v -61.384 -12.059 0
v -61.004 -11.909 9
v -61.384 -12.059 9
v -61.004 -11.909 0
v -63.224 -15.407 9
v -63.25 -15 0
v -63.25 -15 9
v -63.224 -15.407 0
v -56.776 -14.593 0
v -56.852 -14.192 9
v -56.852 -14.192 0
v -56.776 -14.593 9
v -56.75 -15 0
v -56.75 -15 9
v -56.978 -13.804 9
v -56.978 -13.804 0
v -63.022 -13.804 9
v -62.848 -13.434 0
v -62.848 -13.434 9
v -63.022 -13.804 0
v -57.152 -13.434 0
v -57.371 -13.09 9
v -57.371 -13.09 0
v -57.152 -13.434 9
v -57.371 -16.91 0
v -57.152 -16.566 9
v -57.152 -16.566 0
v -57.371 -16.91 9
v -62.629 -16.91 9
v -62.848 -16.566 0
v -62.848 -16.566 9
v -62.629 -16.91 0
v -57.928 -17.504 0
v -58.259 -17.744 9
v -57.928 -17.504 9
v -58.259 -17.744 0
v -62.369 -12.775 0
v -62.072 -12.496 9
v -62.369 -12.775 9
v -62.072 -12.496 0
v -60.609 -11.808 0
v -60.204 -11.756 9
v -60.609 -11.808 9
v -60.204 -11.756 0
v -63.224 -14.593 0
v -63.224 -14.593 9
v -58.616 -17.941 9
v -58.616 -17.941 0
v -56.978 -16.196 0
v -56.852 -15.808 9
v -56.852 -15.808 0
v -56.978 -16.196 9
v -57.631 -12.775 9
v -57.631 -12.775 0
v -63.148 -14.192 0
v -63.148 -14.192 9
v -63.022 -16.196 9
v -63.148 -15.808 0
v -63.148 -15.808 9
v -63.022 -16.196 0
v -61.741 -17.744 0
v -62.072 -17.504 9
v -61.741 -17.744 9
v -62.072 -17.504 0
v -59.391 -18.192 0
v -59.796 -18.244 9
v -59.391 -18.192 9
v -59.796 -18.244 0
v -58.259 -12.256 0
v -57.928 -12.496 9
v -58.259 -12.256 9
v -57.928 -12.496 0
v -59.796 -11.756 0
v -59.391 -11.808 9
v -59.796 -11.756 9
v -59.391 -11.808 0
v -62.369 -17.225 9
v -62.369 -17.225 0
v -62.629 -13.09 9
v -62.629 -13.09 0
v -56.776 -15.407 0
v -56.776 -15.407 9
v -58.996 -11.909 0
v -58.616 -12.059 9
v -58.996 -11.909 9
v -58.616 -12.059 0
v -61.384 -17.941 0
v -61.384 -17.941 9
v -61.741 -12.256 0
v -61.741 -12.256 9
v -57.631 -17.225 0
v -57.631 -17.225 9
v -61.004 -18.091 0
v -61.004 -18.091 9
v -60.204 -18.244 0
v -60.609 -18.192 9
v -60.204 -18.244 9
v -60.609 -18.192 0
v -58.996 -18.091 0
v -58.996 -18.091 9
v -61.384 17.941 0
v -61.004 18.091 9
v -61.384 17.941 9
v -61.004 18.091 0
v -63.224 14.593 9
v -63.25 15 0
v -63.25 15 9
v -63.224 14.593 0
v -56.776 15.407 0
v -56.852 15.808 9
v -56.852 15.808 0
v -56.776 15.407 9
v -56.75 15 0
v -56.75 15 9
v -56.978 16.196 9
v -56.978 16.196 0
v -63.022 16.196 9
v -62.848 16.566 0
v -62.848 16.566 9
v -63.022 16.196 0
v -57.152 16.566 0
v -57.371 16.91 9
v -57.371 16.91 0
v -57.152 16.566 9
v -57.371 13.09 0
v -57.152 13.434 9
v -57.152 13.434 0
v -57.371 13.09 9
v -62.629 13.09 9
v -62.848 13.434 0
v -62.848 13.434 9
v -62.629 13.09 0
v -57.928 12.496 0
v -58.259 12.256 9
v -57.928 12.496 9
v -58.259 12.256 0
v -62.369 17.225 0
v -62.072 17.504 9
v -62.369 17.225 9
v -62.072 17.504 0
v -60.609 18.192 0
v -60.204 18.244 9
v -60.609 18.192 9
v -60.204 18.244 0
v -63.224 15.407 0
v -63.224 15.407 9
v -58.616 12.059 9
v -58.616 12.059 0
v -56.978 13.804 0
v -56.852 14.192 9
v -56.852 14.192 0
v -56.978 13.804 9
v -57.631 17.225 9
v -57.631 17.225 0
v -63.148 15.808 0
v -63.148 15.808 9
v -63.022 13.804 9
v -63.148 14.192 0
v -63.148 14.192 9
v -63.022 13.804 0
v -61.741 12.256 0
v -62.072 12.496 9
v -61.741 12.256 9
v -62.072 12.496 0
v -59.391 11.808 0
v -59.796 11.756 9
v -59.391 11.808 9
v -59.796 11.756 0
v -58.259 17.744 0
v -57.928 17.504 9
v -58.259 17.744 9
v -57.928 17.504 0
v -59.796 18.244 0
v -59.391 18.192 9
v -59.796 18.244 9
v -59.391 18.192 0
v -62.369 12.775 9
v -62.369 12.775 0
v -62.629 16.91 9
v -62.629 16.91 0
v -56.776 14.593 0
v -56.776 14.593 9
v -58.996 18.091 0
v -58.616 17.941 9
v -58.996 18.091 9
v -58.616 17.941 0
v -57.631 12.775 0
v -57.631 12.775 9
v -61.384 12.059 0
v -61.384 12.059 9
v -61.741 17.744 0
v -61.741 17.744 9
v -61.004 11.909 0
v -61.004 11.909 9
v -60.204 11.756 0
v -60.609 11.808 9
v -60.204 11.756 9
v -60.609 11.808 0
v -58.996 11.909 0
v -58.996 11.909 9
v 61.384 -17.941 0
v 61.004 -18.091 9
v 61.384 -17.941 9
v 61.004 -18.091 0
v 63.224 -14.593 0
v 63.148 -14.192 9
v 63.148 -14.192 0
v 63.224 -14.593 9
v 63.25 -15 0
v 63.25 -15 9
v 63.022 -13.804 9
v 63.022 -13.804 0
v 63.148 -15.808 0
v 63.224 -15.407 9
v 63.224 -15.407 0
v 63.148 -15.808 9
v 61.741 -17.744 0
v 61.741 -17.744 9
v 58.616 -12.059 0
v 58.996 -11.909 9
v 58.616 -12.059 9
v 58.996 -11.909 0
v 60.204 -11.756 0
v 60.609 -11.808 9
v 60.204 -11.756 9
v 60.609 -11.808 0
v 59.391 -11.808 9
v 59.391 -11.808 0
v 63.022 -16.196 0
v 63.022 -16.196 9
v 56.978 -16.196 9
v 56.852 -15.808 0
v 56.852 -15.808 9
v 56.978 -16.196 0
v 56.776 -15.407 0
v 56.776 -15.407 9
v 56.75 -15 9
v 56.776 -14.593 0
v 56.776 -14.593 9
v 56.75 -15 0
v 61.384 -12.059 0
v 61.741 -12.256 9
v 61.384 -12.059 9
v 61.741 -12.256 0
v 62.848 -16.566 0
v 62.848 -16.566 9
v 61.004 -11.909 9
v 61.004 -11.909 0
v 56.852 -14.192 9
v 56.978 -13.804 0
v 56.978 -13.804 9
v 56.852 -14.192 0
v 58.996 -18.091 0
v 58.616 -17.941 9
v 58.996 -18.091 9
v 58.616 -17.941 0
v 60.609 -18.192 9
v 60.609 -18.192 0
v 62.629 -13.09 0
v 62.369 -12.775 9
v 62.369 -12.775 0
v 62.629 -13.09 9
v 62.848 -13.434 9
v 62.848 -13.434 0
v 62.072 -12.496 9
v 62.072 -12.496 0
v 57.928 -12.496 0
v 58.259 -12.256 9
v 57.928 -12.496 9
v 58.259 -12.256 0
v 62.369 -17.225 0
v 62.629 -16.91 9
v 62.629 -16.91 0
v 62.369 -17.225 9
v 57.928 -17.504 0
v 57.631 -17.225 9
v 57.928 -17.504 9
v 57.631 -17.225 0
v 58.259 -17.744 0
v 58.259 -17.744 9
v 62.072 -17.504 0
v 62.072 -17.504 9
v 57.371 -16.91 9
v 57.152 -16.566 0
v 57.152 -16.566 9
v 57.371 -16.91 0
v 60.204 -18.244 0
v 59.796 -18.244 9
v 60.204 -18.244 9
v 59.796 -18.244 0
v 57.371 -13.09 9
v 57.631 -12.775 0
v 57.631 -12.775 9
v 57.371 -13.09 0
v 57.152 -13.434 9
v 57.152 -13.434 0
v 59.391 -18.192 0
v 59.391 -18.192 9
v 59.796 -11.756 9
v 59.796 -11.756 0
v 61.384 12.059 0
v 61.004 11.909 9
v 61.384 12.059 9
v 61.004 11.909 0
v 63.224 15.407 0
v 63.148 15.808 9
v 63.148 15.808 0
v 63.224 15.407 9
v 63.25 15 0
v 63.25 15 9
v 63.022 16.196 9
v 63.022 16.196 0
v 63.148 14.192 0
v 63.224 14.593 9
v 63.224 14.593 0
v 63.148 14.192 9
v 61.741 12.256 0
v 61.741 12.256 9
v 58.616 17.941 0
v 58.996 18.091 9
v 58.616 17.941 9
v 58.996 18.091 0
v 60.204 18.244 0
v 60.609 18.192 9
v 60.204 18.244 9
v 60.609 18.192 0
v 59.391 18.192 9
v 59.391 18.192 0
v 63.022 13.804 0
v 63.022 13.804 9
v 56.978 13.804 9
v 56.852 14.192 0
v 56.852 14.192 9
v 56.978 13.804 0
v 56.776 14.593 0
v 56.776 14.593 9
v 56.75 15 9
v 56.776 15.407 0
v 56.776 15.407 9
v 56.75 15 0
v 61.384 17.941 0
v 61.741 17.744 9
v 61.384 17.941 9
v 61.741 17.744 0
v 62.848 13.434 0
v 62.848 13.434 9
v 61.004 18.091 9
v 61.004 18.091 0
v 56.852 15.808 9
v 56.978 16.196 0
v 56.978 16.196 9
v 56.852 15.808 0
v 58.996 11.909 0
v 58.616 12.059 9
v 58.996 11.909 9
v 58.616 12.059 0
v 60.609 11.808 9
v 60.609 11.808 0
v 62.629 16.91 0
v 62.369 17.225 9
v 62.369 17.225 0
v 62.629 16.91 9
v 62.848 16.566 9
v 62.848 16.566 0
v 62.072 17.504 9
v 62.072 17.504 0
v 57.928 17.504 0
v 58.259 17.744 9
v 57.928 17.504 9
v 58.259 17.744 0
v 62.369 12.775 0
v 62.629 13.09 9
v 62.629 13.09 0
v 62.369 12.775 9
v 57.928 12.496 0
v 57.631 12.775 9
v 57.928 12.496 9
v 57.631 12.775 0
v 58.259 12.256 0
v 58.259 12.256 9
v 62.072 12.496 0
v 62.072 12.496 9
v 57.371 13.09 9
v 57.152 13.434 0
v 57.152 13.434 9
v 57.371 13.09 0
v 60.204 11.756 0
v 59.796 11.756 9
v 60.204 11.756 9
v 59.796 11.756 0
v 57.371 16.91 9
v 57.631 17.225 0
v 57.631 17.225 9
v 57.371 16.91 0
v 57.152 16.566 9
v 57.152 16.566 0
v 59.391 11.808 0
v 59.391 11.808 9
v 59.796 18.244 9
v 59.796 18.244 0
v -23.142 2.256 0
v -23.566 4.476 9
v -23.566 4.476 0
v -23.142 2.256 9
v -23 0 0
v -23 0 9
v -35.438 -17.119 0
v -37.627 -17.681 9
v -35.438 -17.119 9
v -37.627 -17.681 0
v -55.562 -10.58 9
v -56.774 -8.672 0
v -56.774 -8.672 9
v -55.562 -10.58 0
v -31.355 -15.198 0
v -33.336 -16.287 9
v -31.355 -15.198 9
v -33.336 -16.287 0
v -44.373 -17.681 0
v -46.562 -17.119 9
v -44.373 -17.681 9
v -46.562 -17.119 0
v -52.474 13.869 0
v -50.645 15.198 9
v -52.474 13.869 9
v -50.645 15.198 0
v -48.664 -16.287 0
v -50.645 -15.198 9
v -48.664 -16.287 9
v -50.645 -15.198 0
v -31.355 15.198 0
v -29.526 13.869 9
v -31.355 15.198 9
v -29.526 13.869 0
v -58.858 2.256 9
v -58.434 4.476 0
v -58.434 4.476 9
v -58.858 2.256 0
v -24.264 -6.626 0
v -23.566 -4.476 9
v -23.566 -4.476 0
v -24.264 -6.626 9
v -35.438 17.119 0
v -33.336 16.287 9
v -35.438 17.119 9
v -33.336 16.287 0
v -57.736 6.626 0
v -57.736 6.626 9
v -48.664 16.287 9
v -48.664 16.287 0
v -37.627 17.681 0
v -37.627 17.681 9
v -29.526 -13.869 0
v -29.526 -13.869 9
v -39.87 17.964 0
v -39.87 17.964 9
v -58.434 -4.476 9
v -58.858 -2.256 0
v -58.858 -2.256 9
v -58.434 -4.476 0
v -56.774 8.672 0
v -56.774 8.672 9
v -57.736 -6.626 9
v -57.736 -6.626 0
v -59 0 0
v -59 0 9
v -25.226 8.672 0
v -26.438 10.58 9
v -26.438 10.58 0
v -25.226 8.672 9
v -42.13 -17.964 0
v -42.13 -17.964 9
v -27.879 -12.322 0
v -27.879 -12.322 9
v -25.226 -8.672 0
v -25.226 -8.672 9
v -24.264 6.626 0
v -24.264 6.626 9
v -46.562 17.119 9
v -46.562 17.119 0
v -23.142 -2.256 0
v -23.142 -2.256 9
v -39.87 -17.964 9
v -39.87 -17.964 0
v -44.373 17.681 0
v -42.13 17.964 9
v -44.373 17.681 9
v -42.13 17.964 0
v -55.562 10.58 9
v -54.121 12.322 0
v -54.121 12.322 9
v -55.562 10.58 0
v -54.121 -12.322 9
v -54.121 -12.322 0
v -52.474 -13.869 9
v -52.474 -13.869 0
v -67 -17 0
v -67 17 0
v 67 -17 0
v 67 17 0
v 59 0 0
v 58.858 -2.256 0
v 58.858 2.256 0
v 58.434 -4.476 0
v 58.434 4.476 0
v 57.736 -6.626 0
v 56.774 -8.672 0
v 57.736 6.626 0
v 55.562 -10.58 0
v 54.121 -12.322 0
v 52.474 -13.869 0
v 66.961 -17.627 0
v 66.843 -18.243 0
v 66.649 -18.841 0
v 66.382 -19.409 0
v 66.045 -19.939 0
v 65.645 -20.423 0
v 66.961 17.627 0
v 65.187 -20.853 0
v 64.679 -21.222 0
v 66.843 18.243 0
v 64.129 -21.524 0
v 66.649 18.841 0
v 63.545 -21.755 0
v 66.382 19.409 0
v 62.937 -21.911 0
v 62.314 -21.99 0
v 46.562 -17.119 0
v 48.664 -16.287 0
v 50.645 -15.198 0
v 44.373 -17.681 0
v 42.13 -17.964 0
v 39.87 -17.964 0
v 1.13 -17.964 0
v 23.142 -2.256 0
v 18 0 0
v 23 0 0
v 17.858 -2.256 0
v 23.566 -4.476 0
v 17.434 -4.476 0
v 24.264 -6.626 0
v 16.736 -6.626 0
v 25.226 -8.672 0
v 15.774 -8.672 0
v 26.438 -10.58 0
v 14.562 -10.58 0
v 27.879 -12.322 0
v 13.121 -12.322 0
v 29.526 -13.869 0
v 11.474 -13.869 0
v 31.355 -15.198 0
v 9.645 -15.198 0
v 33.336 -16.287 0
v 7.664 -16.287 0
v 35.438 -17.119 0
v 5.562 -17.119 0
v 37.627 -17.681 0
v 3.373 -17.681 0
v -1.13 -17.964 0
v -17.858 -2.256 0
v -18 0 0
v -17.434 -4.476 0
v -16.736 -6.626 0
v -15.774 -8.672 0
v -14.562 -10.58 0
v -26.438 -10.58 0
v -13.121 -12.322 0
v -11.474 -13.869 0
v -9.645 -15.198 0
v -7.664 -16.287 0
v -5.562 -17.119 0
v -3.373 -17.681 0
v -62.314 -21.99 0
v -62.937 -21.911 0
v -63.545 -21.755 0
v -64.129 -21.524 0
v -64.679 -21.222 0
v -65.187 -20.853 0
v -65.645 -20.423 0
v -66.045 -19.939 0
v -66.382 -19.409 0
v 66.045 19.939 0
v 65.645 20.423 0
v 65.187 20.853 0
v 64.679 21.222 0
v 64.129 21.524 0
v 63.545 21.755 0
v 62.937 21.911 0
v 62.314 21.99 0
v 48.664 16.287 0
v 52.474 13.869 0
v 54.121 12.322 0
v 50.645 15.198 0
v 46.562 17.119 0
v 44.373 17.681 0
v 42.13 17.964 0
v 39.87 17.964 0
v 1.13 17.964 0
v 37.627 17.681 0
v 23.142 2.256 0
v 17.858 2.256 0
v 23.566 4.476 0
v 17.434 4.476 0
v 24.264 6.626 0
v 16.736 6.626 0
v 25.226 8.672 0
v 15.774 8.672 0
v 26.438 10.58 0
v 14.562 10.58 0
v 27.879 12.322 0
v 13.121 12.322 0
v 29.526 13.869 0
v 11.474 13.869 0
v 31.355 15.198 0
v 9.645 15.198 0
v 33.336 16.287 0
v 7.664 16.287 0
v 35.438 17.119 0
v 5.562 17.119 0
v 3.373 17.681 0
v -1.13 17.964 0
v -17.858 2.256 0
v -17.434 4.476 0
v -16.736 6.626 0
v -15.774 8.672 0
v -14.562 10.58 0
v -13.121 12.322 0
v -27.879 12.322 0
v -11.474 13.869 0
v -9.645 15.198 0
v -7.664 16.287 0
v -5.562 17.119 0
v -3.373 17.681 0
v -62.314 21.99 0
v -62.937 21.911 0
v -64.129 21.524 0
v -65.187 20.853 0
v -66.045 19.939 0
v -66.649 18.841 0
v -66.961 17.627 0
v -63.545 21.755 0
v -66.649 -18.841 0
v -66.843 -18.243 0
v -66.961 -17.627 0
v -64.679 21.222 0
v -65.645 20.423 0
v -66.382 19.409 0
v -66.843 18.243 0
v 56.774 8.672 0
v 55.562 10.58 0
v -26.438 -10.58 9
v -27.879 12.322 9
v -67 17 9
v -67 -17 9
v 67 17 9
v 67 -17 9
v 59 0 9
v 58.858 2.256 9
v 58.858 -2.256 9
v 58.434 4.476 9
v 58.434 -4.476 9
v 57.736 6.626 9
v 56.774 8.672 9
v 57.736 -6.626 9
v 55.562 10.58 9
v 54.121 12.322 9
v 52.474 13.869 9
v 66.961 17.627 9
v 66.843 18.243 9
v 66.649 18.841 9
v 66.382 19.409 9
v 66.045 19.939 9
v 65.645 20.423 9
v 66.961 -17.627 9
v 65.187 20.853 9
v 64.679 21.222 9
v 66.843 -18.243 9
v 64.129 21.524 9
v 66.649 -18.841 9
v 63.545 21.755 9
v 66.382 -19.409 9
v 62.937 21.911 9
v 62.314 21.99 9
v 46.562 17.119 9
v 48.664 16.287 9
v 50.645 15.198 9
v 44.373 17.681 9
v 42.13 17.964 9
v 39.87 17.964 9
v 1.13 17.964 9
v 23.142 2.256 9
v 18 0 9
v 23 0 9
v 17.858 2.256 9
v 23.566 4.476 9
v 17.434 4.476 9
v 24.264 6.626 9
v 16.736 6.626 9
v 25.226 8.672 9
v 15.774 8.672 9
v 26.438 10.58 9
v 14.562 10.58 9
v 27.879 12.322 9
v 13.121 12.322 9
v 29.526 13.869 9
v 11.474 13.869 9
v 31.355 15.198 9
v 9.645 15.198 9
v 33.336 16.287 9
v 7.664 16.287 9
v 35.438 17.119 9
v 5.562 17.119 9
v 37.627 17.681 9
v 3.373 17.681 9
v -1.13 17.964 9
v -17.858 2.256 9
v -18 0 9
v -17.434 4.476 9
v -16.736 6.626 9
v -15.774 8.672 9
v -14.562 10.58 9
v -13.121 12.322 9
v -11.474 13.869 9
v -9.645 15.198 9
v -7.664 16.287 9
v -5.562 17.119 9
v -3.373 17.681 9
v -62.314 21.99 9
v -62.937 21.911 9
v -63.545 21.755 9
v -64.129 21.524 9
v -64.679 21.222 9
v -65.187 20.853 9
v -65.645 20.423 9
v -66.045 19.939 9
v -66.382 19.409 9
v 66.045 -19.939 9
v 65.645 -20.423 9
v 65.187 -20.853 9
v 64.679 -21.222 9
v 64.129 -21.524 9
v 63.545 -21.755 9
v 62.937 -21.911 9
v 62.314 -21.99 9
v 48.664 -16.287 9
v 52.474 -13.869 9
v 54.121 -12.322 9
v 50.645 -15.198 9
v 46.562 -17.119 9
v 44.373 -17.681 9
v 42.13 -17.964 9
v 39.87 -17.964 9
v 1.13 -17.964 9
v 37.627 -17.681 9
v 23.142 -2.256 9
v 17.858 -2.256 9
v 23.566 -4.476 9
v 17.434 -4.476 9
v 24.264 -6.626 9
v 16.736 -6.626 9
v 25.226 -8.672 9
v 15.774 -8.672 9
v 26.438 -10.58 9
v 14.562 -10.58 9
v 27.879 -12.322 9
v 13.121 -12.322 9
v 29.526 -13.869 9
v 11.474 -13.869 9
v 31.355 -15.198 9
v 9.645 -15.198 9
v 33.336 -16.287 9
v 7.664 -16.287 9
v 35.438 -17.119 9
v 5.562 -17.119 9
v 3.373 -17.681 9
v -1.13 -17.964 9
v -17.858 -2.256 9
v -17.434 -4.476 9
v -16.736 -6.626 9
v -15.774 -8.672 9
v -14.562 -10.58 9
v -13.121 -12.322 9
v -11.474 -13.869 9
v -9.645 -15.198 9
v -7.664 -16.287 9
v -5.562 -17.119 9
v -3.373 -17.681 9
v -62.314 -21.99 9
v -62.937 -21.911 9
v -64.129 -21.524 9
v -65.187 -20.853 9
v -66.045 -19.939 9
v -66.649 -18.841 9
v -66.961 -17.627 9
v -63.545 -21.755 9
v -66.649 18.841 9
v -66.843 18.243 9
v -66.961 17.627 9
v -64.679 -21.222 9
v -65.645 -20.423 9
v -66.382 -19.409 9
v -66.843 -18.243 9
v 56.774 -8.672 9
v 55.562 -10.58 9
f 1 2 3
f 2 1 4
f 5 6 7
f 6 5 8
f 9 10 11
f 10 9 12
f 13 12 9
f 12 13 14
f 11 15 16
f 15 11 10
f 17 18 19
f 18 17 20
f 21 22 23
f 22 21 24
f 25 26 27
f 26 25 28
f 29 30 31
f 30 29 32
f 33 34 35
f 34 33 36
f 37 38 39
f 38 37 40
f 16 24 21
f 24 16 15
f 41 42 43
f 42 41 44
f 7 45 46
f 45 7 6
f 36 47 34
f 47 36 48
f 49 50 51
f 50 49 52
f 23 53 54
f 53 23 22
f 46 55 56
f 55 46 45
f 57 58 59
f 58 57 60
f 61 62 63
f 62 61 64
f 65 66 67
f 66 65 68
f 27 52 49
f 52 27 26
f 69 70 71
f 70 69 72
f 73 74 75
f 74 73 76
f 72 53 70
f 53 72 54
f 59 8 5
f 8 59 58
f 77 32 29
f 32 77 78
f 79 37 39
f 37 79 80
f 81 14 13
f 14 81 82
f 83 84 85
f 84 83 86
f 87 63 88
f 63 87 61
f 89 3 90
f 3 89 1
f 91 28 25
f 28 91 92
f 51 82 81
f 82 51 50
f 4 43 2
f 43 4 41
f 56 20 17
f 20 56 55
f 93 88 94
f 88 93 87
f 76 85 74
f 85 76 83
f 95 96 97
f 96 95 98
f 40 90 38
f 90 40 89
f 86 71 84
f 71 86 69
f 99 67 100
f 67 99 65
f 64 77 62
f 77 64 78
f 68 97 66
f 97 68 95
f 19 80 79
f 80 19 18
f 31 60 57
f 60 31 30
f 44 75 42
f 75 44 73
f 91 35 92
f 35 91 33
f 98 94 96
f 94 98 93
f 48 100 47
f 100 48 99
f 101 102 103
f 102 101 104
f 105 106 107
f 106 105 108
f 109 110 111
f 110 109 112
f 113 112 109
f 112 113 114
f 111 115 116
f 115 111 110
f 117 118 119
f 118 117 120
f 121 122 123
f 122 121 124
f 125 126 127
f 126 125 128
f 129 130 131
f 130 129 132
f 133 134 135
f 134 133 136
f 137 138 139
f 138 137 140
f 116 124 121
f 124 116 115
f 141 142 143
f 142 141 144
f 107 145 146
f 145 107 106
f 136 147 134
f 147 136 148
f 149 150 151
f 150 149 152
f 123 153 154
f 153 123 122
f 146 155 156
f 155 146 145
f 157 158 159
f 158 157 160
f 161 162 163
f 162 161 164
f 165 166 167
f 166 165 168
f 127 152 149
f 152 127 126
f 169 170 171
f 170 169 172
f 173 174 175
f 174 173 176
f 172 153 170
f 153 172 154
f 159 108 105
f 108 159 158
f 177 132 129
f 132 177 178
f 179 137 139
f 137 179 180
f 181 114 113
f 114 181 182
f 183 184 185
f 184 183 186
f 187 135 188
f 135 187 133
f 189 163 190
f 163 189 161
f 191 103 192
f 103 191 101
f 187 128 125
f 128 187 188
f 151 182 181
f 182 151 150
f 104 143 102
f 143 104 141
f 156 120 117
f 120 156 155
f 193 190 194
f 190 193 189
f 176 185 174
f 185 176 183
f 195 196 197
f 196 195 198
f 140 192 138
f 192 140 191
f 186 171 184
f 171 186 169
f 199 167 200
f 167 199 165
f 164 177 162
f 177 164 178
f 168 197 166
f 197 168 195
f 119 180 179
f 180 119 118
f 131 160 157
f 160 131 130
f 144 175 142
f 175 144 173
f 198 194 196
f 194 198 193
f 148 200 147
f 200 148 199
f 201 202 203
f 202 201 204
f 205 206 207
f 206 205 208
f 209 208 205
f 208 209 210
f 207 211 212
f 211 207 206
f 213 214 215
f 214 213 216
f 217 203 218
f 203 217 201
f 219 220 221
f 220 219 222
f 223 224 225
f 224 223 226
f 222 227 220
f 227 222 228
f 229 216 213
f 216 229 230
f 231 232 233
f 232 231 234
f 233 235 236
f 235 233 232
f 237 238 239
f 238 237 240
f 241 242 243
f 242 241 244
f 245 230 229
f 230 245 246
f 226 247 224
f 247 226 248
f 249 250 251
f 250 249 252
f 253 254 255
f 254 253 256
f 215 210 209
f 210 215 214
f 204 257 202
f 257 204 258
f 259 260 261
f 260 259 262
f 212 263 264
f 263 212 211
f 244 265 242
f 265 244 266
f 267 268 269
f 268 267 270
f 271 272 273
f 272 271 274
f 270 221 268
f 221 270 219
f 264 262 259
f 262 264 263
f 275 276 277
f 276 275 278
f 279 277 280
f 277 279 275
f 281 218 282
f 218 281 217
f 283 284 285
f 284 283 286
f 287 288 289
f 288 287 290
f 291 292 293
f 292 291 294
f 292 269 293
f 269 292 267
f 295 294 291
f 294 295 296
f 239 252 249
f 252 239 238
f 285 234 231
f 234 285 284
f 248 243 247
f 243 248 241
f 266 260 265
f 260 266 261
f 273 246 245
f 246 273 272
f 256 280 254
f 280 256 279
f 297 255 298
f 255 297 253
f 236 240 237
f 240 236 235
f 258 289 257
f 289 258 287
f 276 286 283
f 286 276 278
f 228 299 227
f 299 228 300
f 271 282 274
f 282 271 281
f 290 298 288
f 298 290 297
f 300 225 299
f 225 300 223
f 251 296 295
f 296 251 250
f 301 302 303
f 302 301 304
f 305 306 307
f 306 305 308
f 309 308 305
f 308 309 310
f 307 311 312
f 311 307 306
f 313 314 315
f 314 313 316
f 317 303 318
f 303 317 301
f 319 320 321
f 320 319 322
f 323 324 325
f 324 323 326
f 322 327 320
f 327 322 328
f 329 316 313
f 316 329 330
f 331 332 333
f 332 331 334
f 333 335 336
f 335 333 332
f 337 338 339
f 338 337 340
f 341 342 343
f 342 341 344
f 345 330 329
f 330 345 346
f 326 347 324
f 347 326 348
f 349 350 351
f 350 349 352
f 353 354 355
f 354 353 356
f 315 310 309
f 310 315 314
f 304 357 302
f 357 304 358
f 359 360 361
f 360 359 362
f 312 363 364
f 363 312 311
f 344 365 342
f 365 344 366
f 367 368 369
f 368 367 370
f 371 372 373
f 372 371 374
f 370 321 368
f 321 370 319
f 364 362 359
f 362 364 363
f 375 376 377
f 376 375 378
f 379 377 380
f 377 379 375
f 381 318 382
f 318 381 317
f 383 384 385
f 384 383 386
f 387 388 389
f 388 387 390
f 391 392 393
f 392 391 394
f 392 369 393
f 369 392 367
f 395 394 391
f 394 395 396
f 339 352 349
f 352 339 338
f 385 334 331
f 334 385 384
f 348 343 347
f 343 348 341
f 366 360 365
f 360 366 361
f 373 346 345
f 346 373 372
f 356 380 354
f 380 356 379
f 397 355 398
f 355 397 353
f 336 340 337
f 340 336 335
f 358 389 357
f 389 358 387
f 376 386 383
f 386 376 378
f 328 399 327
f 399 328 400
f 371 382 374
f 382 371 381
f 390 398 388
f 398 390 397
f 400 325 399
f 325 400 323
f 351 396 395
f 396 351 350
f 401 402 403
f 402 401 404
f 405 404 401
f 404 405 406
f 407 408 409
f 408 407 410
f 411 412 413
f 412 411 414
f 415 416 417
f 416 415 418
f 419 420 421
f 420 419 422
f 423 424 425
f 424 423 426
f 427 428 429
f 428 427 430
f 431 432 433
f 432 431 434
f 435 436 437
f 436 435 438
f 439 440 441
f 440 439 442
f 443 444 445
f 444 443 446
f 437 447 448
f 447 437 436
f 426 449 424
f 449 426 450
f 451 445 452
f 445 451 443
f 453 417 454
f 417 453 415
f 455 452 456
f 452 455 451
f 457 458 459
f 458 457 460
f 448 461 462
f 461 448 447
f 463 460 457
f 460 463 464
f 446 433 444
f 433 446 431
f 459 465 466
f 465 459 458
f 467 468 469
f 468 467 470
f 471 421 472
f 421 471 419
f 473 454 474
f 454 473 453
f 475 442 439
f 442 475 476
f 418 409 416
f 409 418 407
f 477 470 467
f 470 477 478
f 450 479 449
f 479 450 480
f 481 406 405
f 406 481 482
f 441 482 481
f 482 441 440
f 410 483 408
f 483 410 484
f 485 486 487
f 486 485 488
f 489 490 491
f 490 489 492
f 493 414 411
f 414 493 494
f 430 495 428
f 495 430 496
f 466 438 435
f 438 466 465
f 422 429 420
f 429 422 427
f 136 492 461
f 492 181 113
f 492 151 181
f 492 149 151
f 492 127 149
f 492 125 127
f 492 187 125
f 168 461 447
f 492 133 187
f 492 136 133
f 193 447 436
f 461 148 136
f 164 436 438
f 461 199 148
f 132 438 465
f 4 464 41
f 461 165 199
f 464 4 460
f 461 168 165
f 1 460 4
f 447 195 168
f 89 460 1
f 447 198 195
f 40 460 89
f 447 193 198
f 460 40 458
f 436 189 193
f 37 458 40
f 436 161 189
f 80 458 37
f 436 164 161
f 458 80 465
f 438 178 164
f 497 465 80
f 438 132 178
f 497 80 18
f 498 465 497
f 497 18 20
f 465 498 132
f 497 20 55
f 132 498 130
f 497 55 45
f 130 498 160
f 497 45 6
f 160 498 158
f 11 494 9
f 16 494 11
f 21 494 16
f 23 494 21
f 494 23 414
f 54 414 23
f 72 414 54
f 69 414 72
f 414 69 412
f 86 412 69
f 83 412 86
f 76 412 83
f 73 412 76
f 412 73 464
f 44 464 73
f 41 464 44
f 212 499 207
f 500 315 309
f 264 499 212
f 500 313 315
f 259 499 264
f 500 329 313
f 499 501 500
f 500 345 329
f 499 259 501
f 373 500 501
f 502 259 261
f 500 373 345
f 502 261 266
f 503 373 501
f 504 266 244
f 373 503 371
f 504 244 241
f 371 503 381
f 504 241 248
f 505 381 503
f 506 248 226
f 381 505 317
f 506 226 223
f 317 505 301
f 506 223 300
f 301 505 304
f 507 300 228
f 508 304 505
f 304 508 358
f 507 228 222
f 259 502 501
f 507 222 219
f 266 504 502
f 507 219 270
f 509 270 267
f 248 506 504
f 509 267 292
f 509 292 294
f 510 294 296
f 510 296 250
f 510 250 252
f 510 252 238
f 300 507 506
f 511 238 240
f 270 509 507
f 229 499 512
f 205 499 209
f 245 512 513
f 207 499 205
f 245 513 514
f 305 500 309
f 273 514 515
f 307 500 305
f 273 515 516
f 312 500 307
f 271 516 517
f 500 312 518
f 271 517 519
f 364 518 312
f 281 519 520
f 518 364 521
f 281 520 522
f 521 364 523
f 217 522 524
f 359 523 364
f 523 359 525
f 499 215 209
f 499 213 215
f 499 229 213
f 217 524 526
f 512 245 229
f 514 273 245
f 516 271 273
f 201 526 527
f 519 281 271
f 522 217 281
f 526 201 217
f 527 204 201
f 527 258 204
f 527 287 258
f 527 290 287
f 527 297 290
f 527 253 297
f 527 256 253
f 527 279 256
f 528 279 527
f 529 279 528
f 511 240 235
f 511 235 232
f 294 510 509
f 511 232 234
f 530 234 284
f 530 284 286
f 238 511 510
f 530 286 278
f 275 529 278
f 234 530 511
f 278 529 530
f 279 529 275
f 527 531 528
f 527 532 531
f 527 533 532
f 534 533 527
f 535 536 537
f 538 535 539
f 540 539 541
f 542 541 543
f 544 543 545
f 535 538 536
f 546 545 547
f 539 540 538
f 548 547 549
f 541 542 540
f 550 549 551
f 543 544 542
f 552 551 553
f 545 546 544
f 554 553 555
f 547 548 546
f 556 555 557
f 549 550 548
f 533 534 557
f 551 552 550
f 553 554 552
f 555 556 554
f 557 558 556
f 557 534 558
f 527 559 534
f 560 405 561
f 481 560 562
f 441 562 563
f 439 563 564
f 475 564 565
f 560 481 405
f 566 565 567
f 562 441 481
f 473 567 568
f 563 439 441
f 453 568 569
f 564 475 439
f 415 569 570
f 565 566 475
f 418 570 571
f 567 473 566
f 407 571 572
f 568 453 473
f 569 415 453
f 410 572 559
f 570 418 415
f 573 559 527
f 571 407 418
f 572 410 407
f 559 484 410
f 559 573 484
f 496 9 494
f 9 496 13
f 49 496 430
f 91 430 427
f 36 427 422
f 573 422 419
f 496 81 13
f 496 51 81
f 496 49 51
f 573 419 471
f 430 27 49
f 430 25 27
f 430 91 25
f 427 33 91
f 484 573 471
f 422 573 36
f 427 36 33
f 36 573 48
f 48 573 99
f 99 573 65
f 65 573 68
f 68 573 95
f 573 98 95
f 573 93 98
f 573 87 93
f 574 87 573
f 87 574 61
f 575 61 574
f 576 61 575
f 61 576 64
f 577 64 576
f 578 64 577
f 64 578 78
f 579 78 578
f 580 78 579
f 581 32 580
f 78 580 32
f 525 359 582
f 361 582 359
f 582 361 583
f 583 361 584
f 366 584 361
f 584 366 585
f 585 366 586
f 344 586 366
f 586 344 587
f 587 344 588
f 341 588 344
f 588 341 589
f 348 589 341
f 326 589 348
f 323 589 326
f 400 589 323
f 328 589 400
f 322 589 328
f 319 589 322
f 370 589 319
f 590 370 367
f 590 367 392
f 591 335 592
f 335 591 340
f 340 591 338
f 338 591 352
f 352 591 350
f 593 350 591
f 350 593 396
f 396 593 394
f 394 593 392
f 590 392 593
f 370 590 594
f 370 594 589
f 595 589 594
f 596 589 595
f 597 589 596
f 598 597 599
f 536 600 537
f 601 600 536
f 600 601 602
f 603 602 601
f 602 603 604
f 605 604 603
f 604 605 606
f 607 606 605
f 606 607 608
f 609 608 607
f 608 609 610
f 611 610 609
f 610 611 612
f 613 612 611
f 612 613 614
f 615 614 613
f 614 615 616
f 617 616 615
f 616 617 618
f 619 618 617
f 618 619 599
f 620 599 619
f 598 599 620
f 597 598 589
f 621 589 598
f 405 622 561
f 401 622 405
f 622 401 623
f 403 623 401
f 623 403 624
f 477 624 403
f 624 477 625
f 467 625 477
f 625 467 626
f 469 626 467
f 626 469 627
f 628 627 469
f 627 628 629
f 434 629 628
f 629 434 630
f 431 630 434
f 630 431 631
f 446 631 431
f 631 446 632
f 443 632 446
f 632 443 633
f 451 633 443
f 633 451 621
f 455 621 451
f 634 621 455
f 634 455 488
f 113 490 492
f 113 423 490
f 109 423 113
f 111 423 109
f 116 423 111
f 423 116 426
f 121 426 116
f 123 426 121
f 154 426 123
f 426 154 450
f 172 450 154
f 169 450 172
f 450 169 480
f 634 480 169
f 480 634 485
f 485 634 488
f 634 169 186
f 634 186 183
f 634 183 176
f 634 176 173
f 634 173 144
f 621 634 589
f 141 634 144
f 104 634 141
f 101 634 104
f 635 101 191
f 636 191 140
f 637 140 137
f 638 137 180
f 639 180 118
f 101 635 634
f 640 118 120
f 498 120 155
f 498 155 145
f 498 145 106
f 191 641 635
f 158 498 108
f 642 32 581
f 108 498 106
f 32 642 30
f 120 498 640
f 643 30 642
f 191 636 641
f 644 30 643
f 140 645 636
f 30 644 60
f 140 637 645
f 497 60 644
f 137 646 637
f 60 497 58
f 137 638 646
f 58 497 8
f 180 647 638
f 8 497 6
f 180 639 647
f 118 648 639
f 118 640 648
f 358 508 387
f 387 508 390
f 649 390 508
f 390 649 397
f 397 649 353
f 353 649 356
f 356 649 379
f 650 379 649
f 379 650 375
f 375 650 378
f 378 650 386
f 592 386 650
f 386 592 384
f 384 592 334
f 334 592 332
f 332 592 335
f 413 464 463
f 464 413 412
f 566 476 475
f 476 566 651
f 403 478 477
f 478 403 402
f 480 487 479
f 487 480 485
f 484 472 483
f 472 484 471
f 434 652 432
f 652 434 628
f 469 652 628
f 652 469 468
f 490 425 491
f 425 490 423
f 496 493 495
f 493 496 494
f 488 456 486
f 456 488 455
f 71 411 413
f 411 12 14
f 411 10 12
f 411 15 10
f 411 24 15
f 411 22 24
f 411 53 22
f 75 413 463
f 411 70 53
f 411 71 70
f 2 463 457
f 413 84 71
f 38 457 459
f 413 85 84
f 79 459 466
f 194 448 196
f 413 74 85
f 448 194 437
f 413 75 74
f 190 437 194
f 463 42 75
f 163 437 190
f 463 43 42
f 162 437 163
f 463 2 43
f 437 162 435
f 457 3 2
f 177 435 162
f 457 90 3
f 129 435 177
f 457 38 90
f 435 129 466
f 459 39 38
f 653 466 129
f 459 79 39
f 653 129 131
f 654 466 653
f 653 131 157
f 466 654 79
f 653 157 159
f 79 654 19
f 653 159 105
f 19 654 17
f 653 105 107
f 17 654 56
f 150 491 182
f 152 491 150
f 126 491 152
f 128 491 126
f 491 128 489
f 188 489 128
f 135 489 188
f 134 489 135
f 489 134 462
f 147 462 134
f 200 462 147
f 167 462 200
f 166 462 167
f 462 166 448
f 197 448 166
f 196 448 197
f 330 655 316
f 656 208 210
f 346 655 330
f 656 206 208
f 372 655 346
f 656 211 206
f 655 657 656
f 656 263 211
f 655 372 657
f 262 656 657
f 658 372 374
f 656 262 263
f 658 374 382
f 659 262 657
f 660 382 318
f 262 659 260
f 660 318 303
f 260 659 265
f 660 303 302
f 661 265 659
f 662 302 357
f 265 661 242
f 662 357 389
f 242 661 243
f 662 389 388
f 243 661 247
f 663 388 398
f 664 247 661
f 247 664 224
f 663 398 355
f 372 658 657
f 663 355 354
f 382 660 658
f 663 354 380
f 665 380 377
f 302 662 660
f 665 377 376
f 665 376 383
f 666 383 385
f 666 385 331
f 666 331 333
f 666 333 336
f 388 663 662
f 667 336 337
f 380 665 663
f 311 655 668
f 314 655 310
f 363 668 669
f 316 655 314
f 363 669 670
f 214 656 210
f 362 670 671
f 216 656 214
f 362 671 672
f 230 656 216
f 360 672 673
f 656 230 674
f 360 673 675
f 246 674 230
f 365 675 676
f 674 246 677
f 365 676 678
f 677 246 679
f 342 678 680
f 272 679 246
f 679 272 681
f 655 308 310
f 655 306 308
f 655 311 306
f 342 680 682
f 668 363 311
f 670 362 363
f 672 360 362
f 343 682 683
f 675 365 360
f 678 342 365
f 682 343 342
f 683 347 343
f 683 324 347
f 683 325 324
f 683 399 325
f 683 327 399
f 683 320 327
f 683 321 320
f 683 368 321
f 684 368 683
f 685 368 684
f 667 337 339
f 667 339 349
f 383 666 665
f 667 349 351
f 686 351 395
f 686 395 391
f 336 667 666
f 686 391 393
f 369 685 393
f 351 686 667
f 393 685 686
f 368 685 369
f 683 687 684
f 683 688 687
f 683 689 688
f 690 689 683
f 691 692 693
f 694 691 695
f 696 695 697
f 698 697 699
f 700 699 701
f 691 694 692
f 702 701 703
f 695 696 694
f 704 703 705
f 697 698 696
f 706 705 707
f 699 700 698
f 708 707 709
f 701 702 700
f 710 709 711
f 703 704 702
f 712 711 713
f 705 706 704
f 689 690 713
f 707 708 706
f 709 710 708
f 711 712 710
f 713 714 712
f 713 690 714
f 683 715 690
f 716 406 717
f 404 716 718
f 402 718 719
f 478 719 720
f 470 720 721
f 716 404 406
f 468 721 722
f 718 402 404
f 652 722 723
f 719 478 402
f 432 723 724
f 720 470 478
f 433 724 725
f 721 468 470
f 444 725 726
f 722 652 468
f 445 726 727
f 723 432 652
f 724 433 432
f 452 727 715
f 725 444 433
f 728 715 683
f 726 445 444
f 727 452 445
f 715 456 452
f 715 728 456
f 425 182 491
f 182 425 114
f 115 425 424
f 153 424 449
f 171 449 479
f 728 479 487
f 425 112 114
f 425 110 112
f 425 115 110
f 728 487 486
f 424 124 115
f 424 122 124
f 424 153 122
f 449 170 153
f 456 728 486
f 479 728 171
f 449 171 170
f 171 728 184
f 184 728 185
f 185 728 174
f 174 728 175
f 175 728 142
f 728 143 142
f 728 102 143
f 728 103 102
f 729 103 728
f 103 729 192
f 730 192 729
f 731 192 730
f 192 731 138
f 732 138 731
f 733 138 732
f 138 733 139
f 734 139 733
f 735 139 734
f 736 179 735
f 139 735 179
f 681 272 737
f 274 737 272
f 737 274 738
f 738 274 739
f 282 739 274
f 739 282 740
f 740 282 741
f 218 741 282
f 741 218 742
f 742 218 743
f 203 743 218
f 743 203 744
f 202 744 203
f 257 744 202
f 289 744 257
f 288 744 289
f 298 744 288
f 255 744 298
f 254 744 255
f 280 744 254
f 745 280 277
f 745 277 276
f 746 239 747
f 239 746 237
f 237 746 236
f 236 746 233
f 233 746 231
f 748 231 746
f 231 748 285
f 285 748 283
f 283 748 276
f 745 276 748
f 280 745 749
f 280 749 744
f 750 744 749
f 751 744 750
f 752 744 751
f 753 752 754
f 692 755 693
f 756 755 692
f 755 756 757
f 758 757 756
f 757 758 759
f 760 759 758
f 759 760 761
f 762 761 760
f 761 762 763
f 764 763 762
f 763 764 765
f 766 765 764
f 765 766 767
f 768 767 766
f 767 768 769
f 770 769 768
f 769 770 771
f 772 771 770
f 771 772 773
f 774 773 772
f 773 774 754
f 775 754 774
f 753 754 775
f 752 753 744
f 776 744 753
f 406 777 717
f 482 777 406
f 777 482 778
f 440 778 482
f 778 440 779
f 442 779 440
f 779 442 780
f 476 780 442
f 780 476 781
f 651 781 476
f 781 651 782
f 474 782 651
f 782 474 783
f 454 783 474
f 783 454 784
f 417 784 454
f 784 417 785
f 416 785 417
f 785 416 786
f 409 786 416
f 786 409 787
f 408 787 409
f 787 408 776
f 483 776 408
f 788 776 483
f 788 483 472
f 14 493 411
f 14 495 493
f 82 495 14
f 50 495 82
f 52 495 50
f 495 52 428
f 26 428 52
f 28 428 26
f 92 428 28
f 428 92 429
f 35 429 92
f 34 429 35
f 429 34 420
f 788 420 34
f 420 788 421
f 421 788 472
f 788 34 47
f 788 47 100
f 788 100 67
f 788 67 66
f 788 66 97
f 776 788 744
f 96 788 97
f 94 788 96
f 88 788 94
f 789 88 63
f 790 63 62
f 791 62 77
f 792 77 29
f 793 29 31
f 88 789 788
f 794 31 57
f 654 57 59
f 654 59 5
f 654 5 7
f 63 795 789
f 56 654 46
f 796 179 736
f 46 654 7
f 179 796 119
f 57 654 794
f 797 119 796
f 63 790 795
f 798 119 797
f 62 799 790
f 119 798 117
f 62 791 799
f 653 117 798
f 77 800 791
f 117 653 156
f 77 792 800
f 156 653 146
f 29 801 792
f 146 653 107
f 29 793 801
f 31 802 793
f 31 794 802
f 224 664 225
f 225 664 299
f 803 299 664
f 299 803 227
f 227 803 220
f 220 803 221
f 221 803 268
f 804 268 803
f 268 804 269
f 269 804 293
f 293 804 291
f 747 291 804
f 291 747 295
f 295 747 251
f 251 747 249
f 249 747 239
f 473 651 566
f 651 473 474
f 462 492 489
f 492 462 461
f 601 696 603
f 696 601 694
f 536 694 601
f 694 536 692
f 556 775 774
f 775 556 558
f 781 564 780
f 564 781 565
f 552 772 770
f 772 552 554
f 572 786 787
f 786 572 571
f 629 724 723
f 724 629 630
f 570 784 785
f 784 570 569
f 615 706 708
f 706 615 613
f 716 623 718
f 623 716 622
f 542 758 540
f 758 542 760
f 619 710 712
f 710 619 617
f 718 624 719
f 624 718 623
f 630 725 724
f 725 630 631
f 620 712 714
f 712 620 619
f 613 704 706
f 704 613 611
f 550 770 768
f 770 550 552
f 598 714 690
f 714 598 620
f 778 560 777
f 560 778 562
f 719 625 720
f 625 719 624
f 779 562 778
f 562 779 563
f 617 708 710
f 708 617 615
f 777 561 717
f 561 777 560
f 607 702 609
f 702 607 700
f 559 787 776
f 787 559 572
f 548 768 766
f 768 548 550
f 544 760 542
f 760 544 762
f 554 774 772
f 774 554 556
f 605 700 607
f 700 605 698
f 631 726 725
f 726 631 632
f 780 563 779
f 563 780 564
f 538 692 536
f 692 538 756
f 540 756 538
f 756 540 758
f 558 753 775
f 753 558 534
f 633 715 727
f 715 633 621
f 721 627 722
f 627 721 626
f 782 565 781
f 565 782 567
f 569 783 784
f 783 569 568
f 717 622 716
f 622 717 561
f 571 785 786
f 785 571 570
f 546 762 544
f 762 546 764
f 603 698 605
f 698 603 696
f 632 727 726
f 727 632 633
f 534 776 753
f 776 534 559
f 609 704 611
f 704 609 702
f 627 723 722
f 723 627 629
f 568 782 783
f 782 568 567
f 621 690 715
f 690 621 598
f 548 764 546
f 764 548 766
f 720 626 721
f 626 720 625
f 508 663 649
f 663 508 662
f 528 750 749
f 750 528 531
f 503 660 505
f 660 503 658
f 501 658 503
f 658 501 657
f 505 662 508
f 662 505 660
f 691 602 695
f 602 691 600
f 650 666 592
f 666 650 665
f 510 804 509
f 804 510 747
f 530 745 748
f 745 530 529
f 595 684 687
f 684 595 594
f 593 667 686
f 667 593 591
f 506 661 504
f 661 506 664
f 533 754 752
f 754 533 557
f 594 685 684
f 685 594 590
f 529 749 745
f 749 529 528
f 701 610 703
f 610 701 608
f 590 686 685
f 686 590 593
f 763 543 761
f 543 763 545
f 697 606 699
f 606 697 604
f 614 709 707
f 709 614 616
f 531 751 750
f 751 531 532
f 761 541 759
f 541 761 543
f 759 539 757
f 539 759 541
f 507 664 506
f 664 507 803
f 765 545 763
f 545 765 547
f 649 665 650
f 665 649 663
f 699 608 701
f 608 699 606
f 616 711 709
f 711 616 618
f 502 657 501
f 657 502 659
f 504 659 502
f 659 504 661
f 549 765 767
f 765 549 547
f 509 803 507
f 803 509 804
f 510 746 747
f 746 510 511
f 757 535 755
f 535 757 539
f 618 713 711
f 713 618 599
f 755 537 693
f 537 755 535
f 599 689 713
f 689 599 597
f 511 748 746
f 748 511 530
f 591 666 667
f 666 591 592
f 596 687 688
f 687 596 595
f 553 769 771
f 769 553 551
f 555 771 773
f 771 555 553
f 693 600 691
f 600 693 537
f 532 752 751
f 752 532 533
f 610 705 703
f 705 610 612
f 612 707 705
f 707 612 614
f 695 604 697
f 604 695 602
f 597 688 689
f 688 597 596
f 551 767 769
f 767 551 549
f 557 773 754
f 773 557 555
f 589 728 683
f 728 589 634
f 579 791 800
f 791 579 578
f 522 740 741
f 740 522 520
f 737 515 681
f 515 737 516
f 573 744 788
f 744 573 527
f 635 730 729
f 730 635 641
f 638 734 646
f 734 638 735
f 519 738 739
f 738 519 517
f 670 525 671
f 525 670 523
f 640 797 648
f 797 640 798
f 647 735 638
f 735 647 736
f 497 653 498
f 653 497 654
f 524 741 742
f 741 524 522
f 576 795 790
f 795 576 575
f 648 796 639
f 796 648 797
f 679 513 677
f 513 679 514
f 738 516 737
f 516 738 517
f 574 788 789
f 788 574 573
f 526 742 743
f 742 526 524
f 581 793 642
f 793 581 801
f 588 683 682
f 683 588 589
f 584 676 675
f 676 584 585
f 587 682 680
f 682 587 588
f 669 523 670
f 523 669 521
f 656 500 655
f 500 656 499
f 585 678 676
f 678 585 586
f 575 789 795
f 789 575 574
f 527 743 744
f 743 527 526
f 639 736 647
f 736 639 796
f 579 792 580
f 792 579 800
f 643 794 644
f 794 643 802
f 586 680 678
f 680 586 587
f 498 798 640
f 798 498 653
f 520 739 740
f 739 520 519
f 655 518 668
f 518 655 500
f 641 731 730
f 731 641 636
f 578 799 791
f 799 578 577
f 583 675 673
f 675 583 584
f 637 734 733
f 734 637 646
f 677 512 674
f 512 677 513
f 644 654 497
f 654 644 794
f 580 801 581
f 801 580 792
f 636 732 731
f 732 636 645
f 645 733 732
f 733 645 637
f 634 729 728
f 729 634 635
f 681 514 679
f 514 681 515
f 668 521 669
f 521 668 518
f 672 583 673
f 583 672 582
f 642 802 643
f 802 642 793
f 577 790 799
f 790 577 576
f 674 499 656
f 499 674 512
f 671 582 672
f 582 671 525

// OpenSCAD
$fn = 50;

difference() {
	union() {
		hull() {
			translate(v = [-62.0, 17.0, 0]) {
				cylinder(h = 9, r = 5);
			}
			translate(v = [62.0, 17.0, 0]) {
				cylinder(h = 9, r = 5);
			}
			translate(v = [-62.0, -17.0, 0]) {
				cylinder(h = 9, r = 5);
			}
			translate(v = [62.0, -17.0, 0]) {
				cylinder(h = 9, r = 5);
			}
		}
	}
	union() {
		translate(v = [-60.0, -15.0, -100.0]) {
			cylinder(h = 200, r = 3.25);
		}
		translate(v = [-60.0, 15.0, -100.0]) {
			cylinder(h = 200, r = 3.25);
		}
		translate(v = [60.0, -15.0, -100.0]) {
			cylinder(h = 200, r = 3.25);
		}
		translate(v = [60.0, 15.0, -100.0]) {
			cylinder(h = 200, r = 3.25);
		}
		translate(v = [-60.0, -15.0, -100.0]) {
			cylinder(h = 200, r = 1.8);
		}
		translate(v = [-60.0, 15.0, -100.0]) {
			cylinder(h = 200, r = 1.8);
		}
		translate(v = [60.0, -15.0, -100.0]) {
			cylinder(h = 200, r = 1.8);
		}
		translate(v = [60.0, 15.0, -100.0]) {
			cylinder(h = 200, r = 1.8);
		}
		translate(v = [-41.0, 0, 0.0]) {
			cylinder(h = 9, r = 18.0);
		}
		cylinder(h = 9, r = 18.0);
		translate(v = [41.0, 0, 0.0]) {
			cylinder(h = 9, r = 18.0);
		}
	}
}
